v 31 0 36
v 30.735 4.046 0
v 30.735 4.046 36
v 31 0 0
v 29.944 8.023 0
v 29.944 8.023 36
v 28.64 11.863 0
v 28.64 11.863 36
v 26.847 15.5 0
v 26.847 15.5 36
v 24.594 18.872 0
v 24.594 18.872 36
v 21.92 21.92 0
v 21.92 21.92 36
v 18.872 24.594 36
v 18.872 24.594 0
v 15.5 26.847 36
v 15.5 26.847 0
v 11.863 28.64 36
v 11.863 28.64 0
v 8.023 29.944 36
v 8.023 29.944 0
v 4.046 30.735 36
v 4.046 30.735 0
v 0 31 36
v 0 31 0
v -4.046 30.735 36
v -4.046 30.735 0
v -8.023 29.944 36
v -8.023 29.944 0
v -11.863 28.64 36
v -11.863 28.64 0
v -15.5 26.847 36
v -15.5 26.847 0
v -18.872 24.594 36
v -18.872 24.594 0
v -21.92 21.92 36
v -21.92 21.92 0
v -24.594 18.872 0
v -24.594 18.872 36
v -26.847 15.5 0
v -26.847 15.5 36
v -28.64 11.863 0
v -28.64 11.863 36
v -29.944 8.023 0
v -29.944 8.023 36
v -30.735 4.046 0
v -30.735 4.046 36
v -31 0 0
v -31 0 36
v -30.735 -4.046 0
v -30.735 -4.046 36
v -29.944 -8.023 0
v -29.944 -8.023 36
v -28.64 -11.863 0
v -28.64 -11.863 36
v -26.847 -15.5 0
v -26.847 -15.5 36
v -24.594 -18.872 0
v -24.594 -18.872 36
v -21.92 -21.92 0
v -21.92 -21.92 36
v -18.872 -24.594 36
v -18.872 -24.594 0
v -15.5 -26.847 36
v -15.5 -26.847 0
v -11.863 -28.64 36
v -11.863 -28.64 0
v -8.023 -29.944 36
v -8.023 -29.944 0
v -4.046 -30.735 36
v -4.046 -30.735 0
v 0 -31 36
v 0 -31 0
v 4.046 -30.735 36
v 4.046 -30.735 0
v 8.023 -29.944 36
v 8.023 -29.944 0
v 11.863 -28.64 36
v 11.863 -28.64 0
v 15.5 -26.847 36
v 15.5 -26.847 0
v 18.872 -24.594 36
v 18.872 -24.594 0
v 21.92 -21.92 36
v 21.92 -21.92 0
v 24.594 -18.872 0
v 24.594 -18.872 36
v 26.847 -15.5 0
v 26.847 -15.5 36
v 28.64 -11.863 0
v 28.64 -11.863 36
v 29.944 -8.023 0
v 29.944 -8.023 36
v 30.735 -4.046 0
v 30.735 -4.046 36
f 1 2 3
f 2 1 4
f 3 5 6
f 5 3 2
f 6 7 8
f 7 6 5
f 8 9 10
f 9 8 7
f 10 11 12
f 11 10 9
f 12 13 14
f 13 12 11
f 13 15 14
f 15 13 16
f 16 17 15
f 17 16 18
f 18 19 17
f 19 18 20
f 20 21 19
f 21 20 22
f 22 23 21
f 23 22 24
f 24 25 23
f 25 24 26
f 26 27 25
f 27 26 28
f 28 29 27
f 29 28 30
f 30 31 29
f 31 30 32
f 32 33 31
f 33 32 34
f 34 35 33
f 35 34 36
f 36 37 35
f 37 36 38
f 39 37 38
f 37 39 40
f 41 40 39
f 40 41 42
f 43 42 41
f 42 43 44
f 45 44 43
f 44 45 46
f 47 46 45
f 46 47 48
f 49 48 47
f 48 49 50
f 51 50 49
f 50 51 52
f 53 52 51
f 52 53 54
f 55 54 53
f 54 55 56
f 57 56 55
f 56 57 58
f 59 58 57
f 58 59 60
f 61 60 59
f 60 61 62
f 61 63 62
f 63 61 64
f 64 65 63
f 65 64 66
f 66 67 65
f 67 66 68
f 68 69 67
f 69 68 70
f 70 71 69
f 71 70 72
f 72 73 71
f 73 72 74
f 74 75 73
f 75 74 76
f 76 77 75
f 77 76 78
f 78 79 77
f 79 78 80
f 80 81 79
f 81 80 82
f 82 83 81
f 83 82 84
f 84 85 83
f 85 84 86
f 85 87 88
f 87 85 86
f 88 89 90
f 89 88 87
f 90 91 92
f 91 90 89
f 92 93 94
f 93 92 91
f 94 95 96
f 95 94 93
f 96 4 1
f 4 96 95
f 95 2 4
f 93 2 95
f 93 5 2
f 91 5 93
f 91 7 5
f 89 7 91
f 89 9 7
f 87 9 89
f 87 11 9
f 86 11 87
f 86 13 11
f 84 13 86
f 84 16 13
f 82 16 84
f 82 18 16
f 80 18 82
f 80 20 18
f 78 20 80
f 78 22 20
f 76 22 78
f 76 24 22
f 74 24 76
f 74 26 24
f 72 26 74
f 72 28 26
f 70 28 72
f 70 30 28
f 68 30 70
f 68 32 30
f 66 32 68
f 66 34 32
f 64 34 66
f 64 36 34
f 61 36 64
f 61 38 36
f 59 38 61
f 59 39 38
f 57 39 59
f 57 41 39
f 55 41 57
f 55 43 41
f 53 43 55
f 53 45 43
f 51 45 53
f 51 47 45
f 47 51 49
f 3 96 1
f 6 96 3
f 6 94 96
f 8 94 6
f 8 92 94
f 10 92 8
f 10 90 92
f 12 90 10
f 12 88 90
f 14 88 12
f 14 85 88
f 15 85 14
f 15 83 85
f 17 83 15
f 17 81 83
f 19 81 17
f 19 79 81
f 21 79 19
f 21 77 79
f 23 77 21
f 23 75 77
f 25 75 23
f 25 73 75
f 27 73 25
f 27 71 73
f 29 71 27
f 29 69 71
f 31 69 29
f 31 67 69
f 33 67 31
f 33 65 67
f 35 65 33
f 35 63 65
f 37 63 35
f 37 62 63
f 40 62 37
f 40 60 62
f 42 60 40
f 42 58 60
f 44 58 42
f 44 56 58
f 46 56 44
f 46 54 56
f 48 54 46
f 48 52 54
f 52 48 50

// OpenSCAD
// file: ../common/ds_lib.scad
// DronSwarm · librería común de piezas del frame (S07-S08). Unidades: mm.
//
// Reglas (ADR-003): sin hull()/minkowski()/offset() — FreeCAD los convierte en malla y el STEP deja de ser un
// sólido válido. Las formas redondeadas se arman con uniones de cubos y cilindros. El importador CSG de FreeCAD
// también falla con booleanas 2D y con varios operandos agrupados bajo una sola transformación: cada grupo de
// agujeros debe ser hijo directo del difference(), con su propio translate.
//
// Interfaz de motor DronSwarm (DMI, ADR-011): placa con 4 ranuras radiales a 90°, de modo que el mismo soporte
// acepta varios patrones comerciales y, más adelante, el motor propio (S17+) se diseña para caer en el mismo rango.
//   DMI-S: 4×M3, círculo de tornillos Ø16-Ø25 (motores 28xx-41xx, ≤ 600 W)
//   DMI-L: 4×M4, círculo de tornillos Ø30-Ø42 (motores 50xx-70xx, ≤ 2 kW)

$fn = 48;

M3 = 3.3; M3_HEAD = 6.0; M3_NUT = 6.4;     // pasante, cabeza, tuerca (entre caras + juego)
M4 = 4.4; M4_HEAD = 7.5;
M5 = 5.4;

function dmi_bolt(iface) = iface == "L" ? M4 : M3;
function dmi_r(iface) = iface == "L" ? [15, 21] : [8, 12.5];   // radio mínimo y máximo de las ranuras
function dmi_plate_d(iface) = iface == "L" ? 56 : 36;
function dmi_center(iface) = iface == "L" ? 16 : 10;            // eje, seguro y paso de cables

// Rectángulo con esquinas redondeadas (2D) y su extrusión
module rrect2d(size, r) {
    r2 = min(r, size[0] / 2 - 0.01, size[1] / 2 - 0.01);
    union() {
        translate([r2, 0]) square([size[0] - 2 * r2, size[1]]);
        translate([0, r2]) square([size[0], size[1] - 2 * r2]);
        for (x = [r2, size[0] - r2], y = [r2, size[1] - r2]) translate([x, y]) circle(r = r2);
    }
}
// Caja redondeada con primitivas 3D (sin booleanas 2D: el importador CSG de FreeCAD falla con ellas)
module rbox(size, r) {
    r2 = min(r, size[0] / 2 - 0.01, size[1] / 2 - 0.01);
    union() {
        translate([r2, 0, 0]) cube([size[0] - 2 * r2, size[1], size[2]]);
        translate([0, r2, 0]) cube([size[0], size[1] - 2 * r2, size[2]]);
        for (x = [r2, size[0] - r2], y = [r2, size[1] - r2]) translate([x, y, 0]) cylinder(r = r2, h = size[2]);
    }
}
module crbox(size, r) { translate([-size[0] / 2, -size[1] / 2, 0]) rbox(size, r); }   // centrado en x/y

// Ranura (2D) entre dos puntos sobre el eje x
module slot2d(r0, r1, w) {
    union() {
        translate([r0, -w / 2]) square([r1 - r0, w]);
        translate([r0, 0]) circle(d = w);
        translate([r1, 0]) circle(d = w);
    }
}

// Agujeros de la interfaz de motor (para restar de una placa de espesor t)
module slot3d(r0, r1, w, h) {
    union() {
        translate([r0, -w / 2, 0]) cube([r1 - r0, w, h]);
        translate([r0, 0, 0]) cylinder(d = w, h = h);
        translate([r1, 0, 0]) cylinder(d = w, h = h);
    }
}
module dmi_holes(iface, t) {
    r = dmi_r(iface);
    translate([0, 0, -1]) union() {
        cylinder(d = dmi_center(iface), h = t + 2);
        for (a = [45, 135, 225, 315]) rotate(a) slot3d(r[0], r[1], dmi_bolt(iface), t + 2);
    }
}

// Soporte de motor en la punta del brazo: manguito sobre el tubo + placa DMI arriba
//   el tubo entra por -x; la placa queda centrada en el eje del motor (origen), cara superior en z = 0
module motor_mount(tube_d, iface = "S", sleeve = 34, wall = 3.5) {
    od = tube_d + 2 * wall;
    pd = dmi_plate_d(iface);
    pt = iface == "L" ? 6 : 4;
    zc = -pt - tube_d / 2 - 1;                 // eje del tubo bajo la placa
    difference() {
        union() {
            translate([0, 0, -pt]) cylinder(d = pd, h = pt);                         // placa DMI
            translate([-sleeve - pd / 2 + 6, 0, zc]) rotate([0, 90, 0])
                cylinder(d = od, h = sleeve + pd / 2 - 6 + 4);                       // manguito
            translate([-sleeve - pd / 2 + 6, -od / 2, zc]) cube([sleeve + pd / 2 - 2, od, -zc - pt + 0.01]);  // alma
            translate([-sleeve - pd / 2 + 6, -5, zc - od / 2 - 7]) cube([sleeve, 10, 8]);   // oreja de apriete
        }
        dmi_holes(iface, pt + 0.02, $fn = 32);
        translate([-sleeve - pd / 2 + 5, 0, zc]) rotate([0, 90, 0]) cylinder(d = tube_d + 0.3, h = sleeve + pd / 2 - 3); // tubo
        translate([-sleeve - pd / 2 + 4, -1, zc - od / 2 - 8]) cube([sleeve + 1, 2, od / 2 + 6]);   // ranura de apriete
        for (x = [0.3, 0.75]) translate([-sleeve - pd / 2 + 6 + x * sleeve, 0, zc - od / 2 - 3])
            rotate([90, 0, 0]) cylinder(d = M3, h = 30, center = true);                // tornillos de apriete
        translate([-pd / 2 - 2, 0, zc]) rotate([0, 90, 0]) cylinder(d = 7, h = pd);   // salida de cables del tubo
    }
}

// Bloque de brazo entre las dos placas centrales (impreso PA12-CF): sujeta el tubo y separa las placas.
//   el tubo sale por +x desde el origen; el bloque ocupa x ∈ [-len, 0], altura = gap
module arm_block(tube_d, gap, len = 40, width = 0, bolt = M3) {
    w = width > 0 ? width : tube_d + 14;
    difference() {
        translate([-len, -w / 2, 0]) rbox([len, w, gap], 2);
        translate([-len - 1, 0, gap / 2]) rotate([0, 90, 0]) cylinder(d = tube_d + 0.2, h = len + 2);   // tubo
        translate([-len - 1, -0.75, gap / 2]) cube([len + 2, 1.5, gap / 2 + 1]);                        // ranura de apriete
        for (p = arm_block_bolts(tube_d, len, w)) translate([p[0], p[1], -1]) cylinder(d = bolt, h = gap + 2);
        translate([-len * 0.5, 0, gap * 0.78]) rotate([90, 0, 0]) cylinder(d = M3, h = w + 2, center = true);  // apriete
    }
}
function arm_block_bolts(tube_d, len, w) =
    [for (x = [-len + 6, -6], y = [-(w / 2 - 3.6), w / 2 - 3.6]) [x, y]];

// Patrón de controladora de vuelo (agujeros M3 en cuadrado)
module fc_holes(pattern, t) {
    for (x = [-1, 1], y = [-1, 1]) translate([x * pattern / 2, y * pattern / 2, -1]) cylinder(d = M3, h = t + 2);
}
// file: ds_d_params.scad
// DS-D · parámetros generados por tools/cad/gen_cad_params.py el 2026-10-19
// desde engineering/data/results (spec v1). No editar a mano: regenerar. Unidades: mm, kg.

vehicle = "DS-D";
rotors = 6;
wheelbase = 1453;
arm_radius = 726.5;
prop_d = 660.4;
tube_od = 22;
tube_wall = 1.5;
arm_len = 545;
plate_d = 363.2;
plate_t = 3;
plate_gap = 28;
motor_iface = "L";
battery_dims = [220, 134.4, 76.2];
battery = "12S5P P42A";
leg_h = 420;
fold_arms = true;
mtow_kg = 15.61;
motor_mass_kg = 0.345;
fc_pattern = 30.5;
payload_box = [300, 240, 220];
payload_kg = 5;
// file: ds_d_frame.scad
// DS-D · geometría compartida del frame: posiciones derivadas de los parámetros (spec v1). Unidades: mm.
// Ejes: x adelante, y izquierda, z arriba. z = 0 es la cara superior de la placa inferior.
// Hexa con brazos desmontables (bloques con levas entre las placas, ADR-012), batería y carcasa arriba,
// mecanismo de liberación de la carga al centro abajo, tren de esquíes.

include <ds_d_params.scad>
use <../common/ds_lib.scad>
include <../common/ds_lib.scad>

arm_angles = [0, 60, 120, 180, 240, 300];      // igual que el SDF/PX4 (rotor 0 adelante)
// Brazos desmontables (ADR-012): el tubo entra en un bloque impreso entre las placas y se fija con 2 levas de
// apriete rápido; los cables del motor tienen un conector en el bloque. Se monta/desmonta sin herramientas.
block_len = 60;
block_w = tube_od + 20;
r_block_out = plate_d / 2 - 3;                  // cara exterior del bloque
tube_insert = 54;                               // el tubo entra hasta un tope interior
tube_z = plate_gap / 2;
tube_start = r_block_out - tube_insert;
tube_len = arm_radius - tube_start - 6;
mm_sleeve = 30;

// Arriba: batería transversal atrás y carcasa adelante. Abajo: liberación al centro, FPV adelante
battery_pos = [-60, 0];
housing_size = [130, 110, 62];
housing_pos = [90, 0];
housing_flange = 10;
housing_bolts = [for (x = [-1, 0, 1], y = [-1, 1]) [housing_pos[0] + x * (housing_size[0] / 2 + 6), y * (housing_size[1] / 2 + 6)]];   // fuera del canal de la junta
battery_tray_bolts = [for (x = [-1, 1], y = [-1, 1]) [battery_pos[0] + x * 50, y * 95]];
release_bolts = [for (x = [-1, 1], y = [-1, 1]) [x * 35, y * 20]];
cable_gland_pos = [housing_pos[0] - housing_size[0] / 2 + 20, 0];
fpv_pos = [plate_d / 2 - 30, 0];

// Tren de esquíes: 4 patas inclinadas desde la placa inferior hasta dos esquíes longitudinales (base ancha)
leg_x = 100;                                    // patas en x = ±leg_x
leg_y_top = 110;                                // arriba, bajo la placa
skid_y = 220;                                   // esquíes en y = ±skid_y
skid_len = 560;
gear_tube = 16;                                 // tubos Ø16×1
gear_wall = 1.0;
ground_z = -leg_h;
skid_z = ground_z + gear_tube / 2 + 6;          // eje del esquí (sobre su zapata de TPU de 6 mm)
gear_mount_h = 30;                              // soporte impreso bajo la placa
// pivotes: el del soporte (bajo la placa) y el de la T (eje del esquí); la pata va de uno a otro
pivot_top = [leg_y_top, -plate_t - 6];
pivot_bot = [skid_y, skid_z];
leg_dy = pivot_bot[0] - pivot_top[0];
leg_dz = pivot_top[1] - pivot_bot[1];
leg_tilt = atan(leg_dy / leg_dz);               // inclinación hacia afuera (en torno a x)
leg_in_top = 4;                                 // el tubo termina 4 mm antes del pivote del soporte
leg_in_bot = 10;                                // y 10 mm después del eje del esquí
leg_len = sqrt(leg_dy * leg_dy + leg_dz * leg_dz) - leg_in_top - leg_in_bot;
gear_mount_bolts = [for (sx = [-1, 1], sy = [-1, 1], d = [[-14, -10], [14, -10], [-14, 10], [14, 10]]) [sx * leg_x + d[0], sy * leg_y_top + d[1]]];

motor_d = motor_iface == "L" ? 62 : 38;
motor_h = motor_iface == "L" ? 36 : 26;
function block_bolts() = [for (x = [-block_len + 7, -block_len / 2, -7], y = [-1, 1]) [x, y * (block_w / 2 - 4.5)]];
// main file
// DS-D · componentes comerciales de referencia (no se fabrican). Medidas típicas; se confirman en S09.
include <ds_d_frame.scad>
which = "motor";
module ref(which) {
    if (which == "motor") cylinder(d = motor_d, h = motor_h);
    if (which == "prop") cylinder(d = prop_d, h = 2, $fn = 120);
    if (which == "battery") crbox([battery_dims[1], battery_dims[0], battery_dims[2]], 5);
    if (which == "fc_stack") crbox([36, 36, 24], 3);
    if (which == "companion") crbox([65, 35, 14], 3);
    if (which == "esc") crbox([60, 28, 14], 3);                 // ESC 80 A por motor, en el espacio entre placas
    if (which == "gnss") cylinder(d = 40, h = 12);
    if (which == "servo") translate([-20, -10, 0]) cube([40, 20, 38]);
    if (which == "fpv_cam") translate([-10, -9.5, -9.5]) cube([20, 19, 19]);
    if (which == "led") cylinder(d = 20, h = 6);
    if (which == "payload_box") union() {                         // caja estándar de 5 kg con anilla
        translate([0, 0, -payload_box[2]]) crbox([payload_box[0], payload_box[1], payload_box[2]], 8);
        cylinder(d = 8, h = 10);                                    // vástago del cáncamo, unido a la anilla
        translate([0, 0, 20]) rotate([0, 90, 0]) difference() { cylinder(d = 24, h = 5, center = true); cylinder(d = 14, h = 7, center = true); }
    }
}
ref(which);
